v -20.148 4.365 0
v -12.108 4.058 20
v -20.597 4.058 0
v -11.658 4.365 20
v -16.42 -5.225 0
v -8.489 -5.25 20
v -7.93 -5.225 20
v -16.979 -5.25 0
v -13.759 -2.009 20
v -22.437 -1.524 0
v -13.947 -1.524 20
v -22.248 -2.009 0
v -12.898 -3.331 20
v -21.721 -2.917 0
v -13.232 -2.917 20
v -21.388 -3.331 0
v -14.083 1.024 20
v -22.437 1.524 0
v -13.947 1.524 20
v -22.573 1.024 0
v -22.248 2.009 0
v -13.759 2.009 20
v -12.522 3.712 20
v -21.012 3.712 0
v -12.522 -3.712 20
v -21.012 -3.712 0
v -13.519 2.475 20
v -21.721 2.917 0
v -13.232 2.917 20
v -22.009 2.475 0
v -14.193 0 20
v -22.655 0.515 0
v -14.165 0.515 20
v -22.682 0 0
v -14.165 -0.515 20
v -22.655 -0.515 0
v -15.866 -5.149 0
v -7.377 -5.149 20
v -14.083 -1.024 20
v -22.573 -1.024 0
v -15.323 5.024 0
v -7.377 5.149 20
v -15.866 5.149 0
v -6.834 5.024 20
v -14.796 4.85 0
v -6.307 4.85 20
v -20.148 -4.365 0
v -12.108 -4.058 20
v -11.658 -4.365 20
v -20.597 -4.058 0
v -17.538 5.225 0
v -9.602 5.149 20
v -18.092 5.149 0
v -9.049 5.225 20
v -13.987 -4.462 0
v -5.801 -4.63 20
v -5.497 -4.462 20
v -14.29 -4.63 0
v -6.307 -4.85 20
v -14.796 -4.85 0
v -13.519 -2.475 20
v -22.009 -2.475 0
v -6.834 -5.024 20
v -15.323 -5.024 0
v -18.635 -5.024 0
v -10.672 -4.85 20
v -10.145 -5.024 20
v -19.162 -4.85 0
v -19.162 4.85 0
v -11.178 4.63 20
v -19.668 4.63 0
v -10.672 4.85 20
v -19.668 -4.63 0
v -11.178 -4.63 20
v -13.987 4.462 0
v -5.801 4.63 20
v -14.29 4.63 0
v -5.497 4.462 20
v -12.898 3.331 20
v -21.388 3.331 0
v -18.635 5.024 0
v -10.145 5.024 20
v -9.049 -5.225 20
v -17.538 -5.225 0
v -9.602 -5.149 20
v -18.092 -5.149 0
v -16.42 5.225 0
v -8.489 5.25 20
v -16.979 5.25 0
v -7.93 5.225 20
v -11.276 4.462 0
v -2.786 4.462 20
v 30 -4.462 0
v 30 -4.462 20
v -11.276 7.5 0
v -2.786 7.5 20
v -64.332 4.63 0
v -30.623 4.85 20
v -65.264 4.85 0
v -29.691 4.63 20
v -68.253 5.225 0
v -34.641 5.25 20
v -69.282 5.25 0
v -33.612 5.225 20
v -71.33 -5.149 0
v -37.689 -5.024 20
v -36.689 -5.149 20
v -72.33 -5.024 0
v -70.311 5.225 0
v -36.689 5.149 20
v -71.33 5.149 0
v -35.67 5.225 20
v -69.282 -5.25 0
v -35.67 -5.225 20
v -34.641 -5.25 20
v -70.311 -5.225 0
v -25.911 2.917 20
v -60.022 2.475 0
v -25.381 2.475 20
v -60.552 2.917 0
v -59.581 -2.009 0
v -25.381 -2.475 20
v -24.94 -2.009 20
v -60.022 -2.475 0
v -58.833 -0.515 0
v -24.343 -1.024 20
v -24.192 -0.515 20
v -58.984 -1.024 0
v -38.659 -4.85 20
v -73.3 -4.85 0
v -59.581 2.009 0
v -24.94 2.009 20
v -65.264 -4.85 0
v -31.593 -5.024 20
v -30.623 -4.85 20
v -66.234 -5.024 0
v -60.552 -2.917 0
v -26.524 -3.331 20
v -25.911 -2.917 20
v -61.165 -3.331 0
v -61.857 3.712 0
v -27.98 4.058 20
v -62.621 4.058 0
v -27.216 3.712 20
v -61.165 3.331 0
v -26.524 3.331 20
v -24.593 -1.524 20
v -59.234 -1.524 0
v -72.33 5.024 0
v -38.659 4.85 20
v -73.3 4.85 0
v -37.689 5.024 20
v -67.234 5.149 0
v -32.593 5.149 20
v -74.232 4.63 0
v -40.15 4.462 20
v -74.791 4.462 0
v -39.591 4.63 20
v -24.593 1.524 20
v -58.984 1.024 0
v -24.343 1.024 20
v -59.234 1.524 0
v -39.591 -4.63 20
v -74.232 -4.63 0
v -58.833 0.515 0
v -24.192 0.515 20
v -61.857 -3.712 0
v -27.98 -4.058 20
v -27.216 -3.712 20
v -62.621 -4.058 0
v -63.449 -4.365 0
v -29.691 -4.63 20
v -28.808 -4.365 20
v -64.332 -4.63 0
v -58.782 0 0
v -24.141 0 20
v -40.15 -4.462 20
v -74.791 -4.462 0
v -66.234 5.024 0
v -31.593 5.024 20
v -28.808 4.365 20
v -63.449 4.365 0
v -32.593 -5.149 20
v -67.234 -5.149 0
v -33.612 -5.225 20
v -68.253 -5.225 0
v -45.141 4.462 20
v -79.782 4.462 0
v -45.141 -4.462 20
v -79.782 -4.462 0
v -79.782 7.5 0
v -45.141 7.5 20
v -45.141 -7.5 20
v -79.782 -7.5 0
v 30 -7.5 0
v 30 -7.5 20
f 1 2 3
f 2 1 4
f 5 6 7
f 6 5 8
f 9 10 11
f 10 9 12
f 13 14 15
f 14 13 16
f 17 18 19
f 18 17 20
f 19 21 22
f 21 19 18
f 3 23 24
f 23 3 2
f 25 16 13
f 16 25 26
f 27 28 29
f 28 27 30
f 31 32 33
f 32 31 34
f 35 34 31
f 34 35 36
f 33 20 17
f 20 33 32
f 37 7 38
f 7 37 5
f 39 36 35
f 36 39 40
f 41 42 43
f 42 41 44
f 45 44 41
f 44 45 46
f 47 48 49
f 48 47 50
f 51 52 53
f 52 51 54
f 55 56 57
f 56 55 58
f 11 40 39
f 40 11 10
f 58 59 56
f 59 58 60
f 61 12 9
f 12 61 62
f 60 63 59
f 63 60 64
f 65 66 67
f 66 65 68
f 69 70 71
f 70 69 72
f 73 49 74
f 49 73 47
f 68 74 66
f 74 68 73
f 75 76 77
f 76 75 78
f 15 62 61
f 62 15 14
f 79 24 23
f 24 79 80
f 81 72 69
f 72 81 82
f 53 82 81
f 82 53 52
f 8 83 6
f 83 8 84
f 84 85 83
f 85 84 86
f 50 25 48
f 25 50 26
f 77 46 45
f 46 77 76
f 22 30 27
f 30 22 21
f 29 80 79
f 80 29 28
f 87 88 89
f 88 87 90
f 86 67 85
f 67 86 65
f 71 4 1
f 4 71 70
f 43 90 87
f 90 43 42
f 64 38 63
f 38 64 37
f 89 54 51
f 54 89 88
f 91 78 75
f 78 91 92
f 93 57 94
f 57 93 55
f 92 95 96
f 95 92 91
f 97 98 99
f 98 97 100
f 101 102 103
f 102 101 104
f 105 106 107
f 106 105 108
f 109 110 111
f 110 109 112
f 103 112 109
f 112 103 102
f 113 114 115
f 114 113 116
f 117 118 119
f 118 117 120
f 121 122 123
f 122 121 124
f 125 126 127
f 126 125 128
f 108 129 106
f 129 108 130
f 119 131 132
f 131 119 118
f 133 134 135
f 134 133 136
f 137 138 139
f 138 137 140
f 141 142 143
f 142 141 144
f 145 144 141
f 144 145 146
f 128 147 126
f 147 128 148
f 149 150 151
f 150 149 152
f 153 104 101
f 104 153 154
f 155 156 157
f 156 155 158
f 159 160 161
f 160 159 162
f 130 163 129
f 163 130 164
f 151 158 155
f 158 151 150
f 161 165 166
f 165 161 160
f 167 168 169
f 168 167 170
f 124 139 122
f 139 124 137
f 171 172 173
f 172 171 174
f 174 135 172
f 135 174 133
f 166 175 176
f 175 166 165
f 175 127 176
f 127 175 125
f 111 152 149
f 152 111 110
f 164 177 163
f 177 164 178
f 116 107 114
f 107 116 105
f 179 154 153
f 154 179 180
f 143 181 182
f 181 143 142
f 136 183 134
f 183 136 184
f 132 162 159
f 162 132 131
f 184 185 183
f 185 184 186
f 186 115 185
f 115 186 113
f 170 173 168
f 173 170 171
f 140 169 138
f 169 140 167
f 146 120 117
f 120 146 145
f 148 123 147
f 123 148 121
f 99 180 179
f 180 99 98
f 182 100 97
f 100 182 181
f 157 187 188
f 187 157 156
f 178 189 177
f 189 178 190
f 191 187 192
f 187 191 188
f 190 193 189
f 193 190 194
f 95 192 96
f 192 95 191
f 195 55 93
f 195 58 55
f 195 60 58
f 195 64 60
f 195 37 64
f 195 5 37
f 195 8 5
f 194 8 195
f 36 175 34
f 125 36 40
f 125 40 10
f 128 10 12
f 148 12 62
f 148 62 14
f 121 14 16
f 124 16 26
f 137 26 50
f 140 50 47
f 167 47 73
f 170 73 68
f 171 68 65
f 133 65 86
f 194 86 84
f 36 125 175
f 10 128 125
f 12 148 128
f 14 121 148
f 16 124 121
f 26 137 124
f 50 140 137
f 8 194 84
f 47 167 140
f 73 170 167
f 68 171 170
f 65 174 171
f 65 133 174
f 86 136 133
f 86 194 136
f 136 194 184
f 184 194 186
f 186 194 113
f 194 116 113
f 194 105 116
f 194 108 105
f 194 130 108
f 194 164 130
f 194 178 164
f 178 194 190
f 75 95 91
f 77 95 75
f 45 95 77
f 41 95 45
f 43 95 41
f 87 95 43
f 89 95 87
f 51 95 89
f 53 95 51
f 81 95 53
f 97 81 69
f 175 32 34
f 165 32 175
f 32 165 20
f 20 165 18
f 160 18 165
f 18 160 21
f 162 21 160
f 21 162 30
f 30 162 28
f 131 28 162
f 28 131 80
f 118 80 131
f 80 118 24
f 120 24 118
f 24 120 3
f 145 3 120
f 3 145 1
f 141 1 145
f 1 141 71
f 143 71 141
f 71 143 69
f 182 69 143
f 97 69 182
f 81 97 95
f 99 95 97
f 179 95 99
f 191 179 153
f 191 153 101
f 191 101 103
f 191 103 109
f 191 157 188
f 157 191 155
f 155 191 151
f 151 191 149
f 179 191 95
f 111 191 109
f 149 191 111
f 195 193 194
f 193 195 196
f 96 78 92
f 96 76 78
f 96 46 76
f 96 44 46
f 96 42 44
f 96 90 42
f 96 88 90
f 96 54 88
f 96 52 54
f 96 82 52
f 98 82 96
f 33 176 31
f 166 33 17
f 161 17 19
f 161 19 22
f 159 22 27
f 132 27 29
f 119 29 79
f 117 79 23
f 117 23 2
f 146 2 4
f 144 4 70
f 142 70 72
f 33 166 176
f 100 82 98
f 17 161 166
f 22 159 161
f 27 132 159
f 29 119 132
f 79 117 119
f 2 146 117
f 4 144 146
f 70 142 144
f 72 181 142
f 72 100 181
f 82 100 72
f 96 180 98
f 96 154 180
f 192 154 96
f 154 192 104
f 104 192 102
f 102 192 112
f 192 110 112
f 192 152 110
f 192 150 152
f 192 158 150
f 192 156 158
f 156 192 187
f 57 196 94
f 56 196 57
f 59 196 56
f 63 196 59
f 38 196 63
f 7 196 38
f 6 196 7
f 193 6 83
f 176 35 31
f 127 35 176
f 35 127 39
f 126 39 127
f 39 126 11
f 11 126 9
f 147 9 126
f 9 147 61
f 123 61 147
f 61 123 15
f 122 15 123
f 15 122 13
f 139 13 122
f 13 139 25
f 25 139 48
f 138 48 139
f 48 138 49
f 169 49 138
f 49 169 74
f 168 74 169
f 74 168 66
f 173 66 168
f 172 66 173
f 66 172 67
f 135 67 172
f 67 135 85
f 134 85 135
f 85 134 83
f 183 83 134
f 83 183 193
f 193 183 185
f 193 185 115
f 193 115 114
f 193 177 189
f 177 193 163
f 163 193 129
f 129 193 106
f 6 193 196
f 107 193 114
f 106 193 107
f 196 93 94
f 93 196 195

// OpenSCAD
barDiameter=10.5;
angle=37;
$fn=64;

connectorOffset=40;
connectorWidth=20;
connectorHeight=110;
connectorDepth=15;
connectorDrop=30;

cutOutLength=200;
cutOutClip=0.85;

verticalRotation=30;

mirror([0,0,0])
    pannierClip();

module pannierClip() {
    rotate([0,-90,0])
    translate([connectorOffset,0,0]){
    difference(){
        color("blue")
        translate([-connectorOffset,0,-connectorDrop])
            rotate([90,0,0])
                linear_extrude(connectorDepth,center=true)
                    square([connectorWidth,connectorHeight]);
            
        cutOut(cutOutLength, barDiameter, angle, cutOutClip);
    }
    //cutOut(cutOutLength, barDiameter, angle, cutOutClip);
}
}

module cutOut(length, diameter, angle, clip){
    color("red") 
    rotate([0,-verticalRotation,0]) {
        // Upper Bar
        bar(diameter, length);
        translate([diameter,0,0])
            linear_extrude(length)
                square([diameter*2,diameter*clip],center=true);
        translate([diameter*5.5,0,0])
            linear_extrude(length)
                square([diameter*10,diameter*2],center=true);
        //Lower Bar
        rotate([0,-angle,0]) {
            bar(diameter, length);
            translate([-diameter*1,0,0])
                linear_extrude(length)
                    square([diameter*2,diameter*clip],center=true);
            translate([-diameter*4.5,-diameter/2*clip,0])
                linear_extrude(length)
                    square([diameter*4,diameter*2]);
        }
    }
}

module bar(diameter, length) {
    linear_extrude(length)
        circle(d = diameter);
}
